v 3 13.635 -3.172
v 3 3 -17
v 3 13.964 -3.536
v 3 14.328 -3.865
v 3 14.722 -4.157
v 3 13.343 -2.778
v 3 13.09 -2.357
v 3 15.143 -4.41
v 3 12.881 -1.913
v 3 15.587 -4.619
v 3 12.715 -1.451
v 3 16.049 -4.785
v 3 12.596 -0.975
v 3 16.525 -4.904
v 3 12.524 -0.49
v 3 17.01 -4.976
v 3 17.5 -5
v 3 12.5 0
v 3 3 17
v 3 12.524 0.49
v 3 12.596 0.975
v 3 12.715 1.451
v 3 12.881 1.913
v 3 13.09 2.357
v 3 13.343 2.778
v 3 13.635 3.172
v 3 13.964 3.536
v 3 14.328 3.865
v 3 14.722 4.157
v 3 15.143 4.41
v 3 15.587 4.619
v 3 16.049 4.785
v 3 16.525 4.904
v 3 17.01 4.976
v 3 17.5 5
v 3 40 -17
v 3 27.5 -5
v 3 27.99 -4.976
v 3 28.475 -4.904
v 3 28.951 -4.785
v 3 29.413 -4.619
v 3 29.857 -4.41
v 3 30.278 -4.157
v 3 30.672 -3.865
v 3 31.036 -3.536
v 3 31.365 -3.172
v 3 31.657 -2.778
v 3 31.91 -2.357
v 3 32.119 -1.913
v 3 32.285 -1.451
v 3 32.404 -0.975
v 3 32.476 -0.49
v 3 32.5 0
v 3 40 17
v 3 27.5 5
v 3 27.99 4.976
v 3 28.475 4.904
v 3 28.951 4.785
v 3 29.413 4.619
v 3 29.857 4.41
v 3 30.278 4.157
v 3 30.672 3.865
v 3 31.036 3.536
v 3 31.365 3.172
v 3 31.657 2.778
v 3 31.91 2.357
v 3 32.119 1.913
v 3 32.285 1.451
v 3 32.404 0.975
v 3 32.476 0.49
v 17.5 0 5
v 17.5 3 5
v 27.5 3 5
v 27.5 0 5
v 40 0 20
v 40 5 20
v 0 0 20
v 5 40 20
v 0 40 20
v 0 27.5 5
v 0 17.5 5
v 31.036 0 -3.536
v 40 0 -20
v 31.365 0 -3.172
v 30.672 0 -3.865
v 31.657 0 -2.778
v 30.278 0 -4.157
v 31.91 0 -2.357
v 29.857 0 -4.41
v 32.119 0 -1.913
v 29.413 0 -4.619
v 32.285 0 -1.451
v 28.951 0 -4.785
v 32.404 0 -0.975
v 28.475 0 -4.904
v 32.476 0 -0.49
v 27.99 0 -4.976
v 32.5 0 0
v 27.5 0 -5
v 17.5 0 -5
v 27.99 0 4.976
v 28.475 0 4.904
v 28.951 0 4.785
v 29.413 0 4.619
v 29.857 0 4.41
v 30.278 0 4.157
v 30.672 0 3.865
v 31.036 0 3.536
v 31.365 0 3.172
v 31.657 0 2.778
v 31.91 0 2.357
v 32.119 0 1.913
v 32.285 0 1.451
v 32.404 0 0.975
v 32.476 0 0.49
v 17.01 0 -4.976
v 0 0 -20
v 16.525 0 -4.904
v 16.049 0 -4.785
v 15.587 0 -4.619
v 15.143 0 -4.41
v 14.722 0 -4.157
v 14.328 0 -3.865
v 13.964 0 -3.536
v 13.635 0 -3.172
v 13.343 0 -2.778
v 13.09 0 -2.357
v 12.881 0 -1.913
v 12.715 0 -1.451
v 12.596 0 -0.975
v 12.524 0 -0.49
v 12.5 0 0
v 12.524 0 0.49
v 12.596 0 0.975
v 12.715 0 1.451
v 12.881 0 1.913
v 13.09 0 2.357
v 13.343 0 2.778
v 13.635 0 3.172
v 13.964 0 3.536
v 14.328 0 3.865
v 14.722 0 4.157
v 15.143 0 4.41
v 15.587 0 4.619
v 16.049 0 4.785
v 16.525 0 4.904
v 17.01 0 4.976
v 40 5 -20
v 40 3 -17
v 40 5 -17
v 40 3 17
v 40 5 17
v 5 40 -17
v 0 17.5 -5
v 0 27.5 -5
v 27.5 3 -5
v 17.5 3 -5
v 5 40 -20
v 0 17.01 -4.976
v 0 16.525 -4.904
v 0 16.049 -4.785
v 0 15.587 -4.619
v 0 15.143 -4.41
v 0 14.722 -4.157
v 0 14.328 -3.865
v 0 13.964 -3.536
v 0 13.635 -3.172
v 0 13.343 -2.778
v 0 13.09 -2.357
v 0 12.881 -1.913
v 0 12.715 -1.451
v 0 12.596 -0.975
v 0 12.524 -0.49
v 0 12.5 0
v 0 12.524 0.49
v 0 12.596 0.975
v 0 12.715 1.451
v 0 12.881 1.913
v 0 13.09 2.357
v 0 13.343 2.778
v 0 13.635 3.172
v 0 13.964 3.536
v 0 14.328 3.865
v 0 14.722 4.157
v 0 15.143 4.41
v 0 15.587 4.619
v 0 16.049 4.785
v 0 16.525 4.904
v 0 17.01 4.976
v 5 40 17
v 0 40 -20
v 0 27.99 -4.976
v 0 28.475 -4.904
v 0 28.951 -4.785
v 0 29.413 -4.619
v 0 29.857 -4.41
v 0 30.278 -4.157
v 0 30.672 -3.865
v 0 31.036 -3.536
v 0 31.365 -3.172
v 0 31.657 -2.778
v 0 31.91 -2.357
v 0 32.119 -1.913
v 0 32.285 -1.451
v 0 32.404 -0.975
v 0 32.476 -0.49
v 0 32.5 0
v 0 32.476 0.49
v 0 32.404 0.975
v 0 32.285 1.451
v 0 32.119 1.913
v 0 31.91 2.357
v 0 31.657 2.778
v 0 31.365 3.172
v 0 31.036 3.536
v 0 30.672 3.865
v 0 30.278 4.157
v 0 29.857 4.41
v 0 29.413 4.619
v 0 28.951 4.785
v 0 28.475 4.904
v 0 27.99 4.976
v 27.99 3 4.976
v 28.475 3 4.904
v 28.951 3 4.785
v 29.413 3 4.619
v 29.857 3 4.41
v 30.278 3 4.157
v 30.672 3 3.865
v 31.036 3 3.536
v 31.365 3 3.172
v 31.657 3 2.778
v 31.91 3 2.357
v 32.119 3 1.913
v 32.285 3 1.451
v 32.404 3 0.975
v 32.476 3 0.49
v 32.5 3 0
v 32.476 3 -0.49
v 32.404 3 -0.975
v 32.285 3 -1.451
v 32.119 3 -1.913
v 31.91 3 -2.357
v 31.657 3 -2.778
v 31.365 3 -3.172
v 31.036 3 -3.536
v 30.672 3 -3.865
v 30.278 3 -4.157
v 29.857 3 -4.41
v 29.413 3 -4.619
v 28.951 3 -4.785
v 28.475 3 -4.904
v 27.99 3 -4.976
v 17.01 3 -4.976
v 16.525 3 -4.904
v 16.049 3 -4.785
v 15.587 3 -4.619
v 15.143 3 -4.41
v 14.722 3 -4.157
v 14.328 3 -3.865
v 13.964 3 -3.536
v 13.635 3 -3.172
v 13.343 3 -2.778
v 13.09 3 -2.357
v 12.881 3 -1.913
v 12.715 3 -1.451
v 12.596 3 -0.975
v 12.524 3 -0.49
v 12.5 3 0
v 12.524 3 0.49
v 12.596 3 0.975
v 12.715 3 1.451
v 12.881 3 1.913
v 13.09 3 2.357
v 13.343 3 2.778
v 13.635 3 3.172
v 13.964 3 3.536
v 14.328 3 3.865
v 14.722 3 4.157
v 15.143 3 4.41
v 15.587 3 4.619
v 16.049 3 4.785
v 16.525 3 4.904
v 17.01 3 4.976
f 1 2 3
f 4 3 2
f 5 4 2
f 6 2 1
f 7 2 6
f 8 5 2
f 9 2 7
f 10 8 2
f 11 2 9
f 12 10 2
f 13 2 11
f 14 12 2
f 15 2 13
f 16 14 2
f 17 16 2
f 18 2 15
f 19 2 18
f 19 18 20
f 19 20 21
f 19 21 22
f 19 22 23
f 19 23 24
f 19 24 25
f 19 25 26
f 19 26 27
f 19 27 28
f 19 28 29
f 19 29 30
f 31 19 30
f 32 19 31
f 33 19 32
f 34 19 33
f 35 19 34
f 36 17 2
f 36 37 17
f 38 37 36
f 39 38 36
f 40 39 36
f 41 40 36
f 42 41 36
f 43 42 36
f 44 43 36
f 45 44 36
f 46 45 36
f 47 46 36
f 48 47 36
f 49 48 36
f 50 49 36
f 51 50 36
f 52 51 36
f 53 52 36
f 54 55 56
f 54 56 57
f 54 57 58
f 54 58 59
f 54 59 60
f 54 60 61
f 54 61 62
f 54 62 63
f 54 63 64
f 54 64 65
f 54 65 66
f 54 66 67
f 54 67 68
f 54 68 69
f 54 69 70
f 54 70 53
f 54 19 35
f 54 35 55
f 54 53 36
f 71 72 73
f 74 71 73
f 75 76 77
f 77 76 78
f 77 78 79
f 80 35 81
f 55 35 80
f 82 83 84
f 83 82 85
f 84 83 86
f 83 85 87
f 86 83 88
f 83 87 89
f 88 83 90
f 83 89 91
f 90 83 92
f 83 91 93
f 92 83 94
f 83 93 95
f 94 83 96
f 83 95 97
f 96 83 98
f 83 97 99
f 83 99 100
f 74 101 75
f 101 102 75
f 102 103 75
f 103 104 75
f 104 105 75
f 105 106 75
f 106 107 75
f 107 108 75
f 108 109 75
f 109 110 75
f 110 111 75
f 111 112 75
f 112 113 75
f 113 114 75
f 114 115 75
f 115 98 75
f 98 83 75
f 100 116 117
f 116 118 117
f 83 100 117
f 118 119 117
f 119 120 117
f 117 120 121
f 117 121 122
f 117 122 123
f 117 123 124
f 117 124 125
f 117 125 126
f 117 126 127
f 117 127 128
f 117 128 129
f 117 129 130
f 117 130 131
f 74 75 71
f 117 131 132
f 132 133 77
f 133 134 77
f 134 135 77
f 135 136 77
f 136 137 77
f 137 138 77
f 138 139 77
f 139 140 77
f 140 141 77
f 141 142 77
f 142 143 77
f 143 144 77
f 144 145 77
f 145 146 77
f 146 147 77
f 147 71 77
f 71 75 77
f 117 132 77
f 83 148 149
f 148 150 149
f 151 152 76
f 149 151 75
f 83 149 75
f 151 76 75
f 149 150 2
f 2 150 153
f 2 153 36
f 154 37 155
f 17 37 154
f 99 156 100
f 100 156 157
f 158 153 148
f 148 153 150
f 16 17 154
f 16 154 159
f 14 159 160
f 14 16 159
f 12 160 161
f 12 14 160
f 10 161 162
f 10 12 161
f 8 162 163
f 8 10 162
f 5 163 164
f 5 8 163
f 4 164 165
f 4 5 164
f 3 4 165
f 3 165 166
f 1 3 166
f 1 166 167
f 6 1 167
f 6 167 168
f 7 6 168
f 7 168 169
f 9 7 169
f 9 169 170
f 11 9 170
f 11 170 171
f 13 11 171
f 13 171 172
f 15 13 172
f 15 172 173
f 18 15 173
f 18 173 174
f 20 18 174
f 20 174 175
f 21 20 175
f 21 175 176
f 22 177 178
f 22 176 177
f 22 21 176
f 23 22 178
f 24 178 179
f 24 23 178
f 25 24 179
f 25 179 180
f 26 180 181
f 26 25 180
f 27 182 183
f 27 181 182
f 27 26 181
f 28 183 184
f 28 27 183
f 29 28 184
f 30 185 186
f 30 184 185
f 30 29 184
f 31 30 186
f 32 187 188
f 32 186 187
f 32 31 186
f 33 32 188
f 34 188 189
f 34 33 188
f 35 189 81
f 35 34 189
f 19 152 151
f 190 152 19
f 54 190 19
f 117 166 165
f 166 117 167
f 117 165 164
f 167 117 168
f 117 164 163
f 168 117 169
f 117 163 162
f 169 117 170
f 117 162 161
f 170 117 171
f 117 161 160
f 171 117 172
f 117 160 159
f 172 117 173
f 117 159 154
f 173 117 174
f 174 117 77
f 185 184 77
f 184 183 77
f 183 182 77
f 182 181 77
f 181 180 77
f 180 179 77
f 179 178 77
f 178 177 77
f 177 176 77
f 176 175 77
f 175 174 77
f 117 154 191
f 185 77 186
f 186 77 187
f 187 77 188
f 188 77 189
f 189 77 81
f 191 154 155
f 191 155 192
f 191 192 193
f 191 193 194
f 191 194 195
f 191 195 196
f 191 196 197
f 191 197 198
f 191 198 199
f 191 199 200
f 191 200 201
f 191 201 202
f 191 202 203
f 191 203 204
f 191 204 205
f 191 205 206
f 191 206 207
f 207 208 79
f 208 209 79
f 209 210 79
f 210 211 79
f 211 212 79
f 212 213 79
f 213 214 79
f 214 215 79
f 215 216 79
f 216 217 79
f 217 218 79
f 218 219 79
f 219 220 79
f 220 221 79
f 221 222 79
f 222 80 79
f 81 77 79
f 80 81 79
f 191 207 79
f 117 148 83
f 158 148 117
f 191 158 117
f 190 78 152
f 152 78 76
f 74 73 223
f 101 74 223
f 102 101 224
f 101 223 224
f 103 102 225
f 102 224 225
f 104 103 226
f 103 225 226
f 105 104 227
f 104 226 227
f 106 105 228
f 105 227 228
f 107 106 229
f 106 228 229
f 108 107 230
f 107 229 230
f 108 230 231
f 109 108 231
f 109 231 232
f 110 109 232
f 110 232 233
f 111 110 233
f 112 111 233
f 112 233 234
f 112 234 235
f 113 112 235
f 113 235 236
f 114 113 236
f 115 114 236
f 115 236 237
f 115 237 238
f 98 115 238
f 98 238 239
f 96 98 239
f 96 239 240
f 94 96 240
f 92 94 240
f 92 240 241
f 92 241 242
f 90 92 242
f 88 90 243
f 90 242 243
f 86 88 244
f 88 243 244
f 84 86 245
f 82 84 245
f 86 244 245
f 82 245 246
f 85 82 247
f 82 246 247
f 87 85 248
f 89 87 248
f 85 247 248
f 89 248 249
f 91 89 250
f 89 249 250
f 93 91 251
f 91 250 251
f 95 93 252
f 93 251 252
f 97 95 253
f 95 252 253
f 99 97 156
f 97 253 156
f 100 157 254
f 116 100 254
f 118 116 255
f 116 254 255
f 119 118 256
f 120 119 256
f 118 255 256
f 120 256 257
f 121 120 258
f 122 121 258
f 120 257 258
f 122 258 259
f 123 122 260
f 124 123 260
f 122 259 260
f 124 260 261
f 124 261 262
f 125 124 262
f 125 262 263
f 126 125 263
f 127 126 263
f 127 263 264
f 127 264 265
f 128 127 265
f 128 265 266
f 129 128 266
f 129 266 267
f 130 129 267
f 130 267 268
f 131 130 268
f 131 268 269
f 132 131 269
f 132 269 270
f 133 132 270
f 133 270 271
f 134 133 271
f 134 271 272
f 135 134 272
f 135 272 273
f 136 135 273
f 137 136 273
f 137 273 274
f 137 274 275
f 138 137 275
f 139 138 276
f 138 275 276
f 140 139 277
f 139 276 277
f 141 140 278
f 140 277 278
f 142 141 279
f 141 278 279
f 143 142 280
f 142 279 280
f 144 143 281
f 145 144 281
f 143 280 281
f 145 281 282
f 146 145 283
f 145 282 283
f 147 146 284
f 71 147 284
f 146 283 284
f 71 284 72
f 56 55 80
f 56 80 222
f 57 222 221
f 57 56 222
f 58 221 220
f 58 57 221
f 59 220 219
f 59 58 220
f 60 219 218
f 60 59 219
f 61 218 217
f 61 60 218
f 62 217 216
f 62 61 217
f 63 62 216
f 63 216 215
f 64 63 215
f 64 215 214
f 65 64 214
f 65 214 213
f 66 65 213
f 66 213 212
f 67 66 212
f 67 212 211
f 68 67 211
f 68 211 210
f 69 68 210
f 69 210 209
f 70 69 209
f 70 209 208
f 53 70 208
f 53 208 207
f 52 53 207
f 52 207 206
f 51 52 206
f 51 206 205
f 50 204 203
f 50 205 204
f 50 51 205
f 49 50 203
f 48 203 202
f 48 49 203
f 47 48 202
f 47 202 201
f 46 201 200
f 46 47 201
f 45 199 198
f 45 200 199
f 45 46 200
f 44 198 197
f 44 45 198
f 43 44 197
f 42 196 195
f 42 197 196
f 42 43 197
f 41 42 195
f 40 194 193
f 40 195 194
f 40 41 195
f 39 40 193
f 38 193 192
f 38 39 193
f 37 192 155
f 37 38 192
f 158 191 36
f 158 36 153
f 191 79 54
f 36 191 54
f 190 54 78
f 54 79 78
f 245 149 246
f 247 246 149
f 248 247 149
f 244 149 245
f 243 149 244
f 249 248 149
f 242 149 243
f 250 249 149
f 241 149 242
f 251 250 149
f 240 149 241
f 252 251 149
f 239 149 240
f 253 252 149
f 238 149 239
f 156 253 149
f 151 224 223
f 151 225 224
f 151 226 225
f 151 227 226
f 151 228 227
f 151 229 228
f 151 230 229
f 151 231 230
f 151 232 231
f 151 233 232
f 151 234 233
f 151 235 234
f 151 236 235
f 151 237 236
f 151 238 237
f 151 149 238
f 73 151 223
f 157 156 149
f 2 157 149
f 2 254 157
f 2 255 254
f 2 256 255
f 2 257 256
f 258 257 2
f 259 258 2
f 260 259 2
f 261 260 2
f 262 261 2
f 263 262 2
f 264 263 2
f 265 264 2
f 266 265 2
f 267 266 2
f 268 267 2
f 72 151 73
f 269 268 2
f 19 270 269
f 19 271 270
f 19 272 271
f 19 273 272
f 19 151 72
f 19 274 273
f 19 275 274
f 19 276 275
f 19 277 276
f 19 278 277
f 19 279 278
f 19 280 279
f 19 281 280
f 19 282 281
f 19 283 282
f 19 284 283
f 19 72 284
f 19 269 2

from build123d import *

# Parameters (mm, degrees)
BOSS_EXTRUDE1_DEPTH = 20
SHELL1_T            = -3
CUT_EXTRUDE1_DEPTH  = 40


with BuildPart() as part:
    # Sketch1 → Boss-Extrude1 (new, symmetric)
    with BuildSketch(Plane.XY):
        Polygon((40, 0), (0, 0), (0, 40), (5, 40), (40, 5), align=None)
    extrude(amount=BOSS_EXTRUDE1_DEPTH, both=True)

    # Shell1
    shell1_openings = [part.faces().sort_by_distance(p)[0] for p in [
        (22.5, 22.5, 0),
        (40, 2.5, 0),
        (2.5, 40, 0),
    ]]
    offset(amount=SHELL1_T, openings=shell1_openings, kind=Kind.INTERSECTION)

    # Sketch2 → Cut-Extrude1 (cut)
    with BuildSketch(Plane(origin=(3, 0, 0), x_dir=(0, 0, -1), z_dir=(1, 0, 0))):
        with BuildLine():
            Line((5, 27.5), (5, 17.5))
            ThreePointArc((5, 17.5), (0, 12.5), (-5, 17.5))
            Line((-5, 17.5), (-5, 27.5))
            ThreePointArc((-5, 27.5), (0, 32.5), (5, 27.5))
        make_face()
    cut_extrude1 = extrude(amount=-CUT_EXTRUDE1_DEPTH, mode=Mode.SUBTRACT)

    # Mirror1: Cut-Extrude1 across plane
    add(cut_extrude1.mirror(Plane(origin=(0, 0, 0), x_dir=(0, 0, 1), z_dir=(0.7071067811865476, -0.7071067811865476, 0))), mode=Mode.SUBTRACT)


solid = part.part
